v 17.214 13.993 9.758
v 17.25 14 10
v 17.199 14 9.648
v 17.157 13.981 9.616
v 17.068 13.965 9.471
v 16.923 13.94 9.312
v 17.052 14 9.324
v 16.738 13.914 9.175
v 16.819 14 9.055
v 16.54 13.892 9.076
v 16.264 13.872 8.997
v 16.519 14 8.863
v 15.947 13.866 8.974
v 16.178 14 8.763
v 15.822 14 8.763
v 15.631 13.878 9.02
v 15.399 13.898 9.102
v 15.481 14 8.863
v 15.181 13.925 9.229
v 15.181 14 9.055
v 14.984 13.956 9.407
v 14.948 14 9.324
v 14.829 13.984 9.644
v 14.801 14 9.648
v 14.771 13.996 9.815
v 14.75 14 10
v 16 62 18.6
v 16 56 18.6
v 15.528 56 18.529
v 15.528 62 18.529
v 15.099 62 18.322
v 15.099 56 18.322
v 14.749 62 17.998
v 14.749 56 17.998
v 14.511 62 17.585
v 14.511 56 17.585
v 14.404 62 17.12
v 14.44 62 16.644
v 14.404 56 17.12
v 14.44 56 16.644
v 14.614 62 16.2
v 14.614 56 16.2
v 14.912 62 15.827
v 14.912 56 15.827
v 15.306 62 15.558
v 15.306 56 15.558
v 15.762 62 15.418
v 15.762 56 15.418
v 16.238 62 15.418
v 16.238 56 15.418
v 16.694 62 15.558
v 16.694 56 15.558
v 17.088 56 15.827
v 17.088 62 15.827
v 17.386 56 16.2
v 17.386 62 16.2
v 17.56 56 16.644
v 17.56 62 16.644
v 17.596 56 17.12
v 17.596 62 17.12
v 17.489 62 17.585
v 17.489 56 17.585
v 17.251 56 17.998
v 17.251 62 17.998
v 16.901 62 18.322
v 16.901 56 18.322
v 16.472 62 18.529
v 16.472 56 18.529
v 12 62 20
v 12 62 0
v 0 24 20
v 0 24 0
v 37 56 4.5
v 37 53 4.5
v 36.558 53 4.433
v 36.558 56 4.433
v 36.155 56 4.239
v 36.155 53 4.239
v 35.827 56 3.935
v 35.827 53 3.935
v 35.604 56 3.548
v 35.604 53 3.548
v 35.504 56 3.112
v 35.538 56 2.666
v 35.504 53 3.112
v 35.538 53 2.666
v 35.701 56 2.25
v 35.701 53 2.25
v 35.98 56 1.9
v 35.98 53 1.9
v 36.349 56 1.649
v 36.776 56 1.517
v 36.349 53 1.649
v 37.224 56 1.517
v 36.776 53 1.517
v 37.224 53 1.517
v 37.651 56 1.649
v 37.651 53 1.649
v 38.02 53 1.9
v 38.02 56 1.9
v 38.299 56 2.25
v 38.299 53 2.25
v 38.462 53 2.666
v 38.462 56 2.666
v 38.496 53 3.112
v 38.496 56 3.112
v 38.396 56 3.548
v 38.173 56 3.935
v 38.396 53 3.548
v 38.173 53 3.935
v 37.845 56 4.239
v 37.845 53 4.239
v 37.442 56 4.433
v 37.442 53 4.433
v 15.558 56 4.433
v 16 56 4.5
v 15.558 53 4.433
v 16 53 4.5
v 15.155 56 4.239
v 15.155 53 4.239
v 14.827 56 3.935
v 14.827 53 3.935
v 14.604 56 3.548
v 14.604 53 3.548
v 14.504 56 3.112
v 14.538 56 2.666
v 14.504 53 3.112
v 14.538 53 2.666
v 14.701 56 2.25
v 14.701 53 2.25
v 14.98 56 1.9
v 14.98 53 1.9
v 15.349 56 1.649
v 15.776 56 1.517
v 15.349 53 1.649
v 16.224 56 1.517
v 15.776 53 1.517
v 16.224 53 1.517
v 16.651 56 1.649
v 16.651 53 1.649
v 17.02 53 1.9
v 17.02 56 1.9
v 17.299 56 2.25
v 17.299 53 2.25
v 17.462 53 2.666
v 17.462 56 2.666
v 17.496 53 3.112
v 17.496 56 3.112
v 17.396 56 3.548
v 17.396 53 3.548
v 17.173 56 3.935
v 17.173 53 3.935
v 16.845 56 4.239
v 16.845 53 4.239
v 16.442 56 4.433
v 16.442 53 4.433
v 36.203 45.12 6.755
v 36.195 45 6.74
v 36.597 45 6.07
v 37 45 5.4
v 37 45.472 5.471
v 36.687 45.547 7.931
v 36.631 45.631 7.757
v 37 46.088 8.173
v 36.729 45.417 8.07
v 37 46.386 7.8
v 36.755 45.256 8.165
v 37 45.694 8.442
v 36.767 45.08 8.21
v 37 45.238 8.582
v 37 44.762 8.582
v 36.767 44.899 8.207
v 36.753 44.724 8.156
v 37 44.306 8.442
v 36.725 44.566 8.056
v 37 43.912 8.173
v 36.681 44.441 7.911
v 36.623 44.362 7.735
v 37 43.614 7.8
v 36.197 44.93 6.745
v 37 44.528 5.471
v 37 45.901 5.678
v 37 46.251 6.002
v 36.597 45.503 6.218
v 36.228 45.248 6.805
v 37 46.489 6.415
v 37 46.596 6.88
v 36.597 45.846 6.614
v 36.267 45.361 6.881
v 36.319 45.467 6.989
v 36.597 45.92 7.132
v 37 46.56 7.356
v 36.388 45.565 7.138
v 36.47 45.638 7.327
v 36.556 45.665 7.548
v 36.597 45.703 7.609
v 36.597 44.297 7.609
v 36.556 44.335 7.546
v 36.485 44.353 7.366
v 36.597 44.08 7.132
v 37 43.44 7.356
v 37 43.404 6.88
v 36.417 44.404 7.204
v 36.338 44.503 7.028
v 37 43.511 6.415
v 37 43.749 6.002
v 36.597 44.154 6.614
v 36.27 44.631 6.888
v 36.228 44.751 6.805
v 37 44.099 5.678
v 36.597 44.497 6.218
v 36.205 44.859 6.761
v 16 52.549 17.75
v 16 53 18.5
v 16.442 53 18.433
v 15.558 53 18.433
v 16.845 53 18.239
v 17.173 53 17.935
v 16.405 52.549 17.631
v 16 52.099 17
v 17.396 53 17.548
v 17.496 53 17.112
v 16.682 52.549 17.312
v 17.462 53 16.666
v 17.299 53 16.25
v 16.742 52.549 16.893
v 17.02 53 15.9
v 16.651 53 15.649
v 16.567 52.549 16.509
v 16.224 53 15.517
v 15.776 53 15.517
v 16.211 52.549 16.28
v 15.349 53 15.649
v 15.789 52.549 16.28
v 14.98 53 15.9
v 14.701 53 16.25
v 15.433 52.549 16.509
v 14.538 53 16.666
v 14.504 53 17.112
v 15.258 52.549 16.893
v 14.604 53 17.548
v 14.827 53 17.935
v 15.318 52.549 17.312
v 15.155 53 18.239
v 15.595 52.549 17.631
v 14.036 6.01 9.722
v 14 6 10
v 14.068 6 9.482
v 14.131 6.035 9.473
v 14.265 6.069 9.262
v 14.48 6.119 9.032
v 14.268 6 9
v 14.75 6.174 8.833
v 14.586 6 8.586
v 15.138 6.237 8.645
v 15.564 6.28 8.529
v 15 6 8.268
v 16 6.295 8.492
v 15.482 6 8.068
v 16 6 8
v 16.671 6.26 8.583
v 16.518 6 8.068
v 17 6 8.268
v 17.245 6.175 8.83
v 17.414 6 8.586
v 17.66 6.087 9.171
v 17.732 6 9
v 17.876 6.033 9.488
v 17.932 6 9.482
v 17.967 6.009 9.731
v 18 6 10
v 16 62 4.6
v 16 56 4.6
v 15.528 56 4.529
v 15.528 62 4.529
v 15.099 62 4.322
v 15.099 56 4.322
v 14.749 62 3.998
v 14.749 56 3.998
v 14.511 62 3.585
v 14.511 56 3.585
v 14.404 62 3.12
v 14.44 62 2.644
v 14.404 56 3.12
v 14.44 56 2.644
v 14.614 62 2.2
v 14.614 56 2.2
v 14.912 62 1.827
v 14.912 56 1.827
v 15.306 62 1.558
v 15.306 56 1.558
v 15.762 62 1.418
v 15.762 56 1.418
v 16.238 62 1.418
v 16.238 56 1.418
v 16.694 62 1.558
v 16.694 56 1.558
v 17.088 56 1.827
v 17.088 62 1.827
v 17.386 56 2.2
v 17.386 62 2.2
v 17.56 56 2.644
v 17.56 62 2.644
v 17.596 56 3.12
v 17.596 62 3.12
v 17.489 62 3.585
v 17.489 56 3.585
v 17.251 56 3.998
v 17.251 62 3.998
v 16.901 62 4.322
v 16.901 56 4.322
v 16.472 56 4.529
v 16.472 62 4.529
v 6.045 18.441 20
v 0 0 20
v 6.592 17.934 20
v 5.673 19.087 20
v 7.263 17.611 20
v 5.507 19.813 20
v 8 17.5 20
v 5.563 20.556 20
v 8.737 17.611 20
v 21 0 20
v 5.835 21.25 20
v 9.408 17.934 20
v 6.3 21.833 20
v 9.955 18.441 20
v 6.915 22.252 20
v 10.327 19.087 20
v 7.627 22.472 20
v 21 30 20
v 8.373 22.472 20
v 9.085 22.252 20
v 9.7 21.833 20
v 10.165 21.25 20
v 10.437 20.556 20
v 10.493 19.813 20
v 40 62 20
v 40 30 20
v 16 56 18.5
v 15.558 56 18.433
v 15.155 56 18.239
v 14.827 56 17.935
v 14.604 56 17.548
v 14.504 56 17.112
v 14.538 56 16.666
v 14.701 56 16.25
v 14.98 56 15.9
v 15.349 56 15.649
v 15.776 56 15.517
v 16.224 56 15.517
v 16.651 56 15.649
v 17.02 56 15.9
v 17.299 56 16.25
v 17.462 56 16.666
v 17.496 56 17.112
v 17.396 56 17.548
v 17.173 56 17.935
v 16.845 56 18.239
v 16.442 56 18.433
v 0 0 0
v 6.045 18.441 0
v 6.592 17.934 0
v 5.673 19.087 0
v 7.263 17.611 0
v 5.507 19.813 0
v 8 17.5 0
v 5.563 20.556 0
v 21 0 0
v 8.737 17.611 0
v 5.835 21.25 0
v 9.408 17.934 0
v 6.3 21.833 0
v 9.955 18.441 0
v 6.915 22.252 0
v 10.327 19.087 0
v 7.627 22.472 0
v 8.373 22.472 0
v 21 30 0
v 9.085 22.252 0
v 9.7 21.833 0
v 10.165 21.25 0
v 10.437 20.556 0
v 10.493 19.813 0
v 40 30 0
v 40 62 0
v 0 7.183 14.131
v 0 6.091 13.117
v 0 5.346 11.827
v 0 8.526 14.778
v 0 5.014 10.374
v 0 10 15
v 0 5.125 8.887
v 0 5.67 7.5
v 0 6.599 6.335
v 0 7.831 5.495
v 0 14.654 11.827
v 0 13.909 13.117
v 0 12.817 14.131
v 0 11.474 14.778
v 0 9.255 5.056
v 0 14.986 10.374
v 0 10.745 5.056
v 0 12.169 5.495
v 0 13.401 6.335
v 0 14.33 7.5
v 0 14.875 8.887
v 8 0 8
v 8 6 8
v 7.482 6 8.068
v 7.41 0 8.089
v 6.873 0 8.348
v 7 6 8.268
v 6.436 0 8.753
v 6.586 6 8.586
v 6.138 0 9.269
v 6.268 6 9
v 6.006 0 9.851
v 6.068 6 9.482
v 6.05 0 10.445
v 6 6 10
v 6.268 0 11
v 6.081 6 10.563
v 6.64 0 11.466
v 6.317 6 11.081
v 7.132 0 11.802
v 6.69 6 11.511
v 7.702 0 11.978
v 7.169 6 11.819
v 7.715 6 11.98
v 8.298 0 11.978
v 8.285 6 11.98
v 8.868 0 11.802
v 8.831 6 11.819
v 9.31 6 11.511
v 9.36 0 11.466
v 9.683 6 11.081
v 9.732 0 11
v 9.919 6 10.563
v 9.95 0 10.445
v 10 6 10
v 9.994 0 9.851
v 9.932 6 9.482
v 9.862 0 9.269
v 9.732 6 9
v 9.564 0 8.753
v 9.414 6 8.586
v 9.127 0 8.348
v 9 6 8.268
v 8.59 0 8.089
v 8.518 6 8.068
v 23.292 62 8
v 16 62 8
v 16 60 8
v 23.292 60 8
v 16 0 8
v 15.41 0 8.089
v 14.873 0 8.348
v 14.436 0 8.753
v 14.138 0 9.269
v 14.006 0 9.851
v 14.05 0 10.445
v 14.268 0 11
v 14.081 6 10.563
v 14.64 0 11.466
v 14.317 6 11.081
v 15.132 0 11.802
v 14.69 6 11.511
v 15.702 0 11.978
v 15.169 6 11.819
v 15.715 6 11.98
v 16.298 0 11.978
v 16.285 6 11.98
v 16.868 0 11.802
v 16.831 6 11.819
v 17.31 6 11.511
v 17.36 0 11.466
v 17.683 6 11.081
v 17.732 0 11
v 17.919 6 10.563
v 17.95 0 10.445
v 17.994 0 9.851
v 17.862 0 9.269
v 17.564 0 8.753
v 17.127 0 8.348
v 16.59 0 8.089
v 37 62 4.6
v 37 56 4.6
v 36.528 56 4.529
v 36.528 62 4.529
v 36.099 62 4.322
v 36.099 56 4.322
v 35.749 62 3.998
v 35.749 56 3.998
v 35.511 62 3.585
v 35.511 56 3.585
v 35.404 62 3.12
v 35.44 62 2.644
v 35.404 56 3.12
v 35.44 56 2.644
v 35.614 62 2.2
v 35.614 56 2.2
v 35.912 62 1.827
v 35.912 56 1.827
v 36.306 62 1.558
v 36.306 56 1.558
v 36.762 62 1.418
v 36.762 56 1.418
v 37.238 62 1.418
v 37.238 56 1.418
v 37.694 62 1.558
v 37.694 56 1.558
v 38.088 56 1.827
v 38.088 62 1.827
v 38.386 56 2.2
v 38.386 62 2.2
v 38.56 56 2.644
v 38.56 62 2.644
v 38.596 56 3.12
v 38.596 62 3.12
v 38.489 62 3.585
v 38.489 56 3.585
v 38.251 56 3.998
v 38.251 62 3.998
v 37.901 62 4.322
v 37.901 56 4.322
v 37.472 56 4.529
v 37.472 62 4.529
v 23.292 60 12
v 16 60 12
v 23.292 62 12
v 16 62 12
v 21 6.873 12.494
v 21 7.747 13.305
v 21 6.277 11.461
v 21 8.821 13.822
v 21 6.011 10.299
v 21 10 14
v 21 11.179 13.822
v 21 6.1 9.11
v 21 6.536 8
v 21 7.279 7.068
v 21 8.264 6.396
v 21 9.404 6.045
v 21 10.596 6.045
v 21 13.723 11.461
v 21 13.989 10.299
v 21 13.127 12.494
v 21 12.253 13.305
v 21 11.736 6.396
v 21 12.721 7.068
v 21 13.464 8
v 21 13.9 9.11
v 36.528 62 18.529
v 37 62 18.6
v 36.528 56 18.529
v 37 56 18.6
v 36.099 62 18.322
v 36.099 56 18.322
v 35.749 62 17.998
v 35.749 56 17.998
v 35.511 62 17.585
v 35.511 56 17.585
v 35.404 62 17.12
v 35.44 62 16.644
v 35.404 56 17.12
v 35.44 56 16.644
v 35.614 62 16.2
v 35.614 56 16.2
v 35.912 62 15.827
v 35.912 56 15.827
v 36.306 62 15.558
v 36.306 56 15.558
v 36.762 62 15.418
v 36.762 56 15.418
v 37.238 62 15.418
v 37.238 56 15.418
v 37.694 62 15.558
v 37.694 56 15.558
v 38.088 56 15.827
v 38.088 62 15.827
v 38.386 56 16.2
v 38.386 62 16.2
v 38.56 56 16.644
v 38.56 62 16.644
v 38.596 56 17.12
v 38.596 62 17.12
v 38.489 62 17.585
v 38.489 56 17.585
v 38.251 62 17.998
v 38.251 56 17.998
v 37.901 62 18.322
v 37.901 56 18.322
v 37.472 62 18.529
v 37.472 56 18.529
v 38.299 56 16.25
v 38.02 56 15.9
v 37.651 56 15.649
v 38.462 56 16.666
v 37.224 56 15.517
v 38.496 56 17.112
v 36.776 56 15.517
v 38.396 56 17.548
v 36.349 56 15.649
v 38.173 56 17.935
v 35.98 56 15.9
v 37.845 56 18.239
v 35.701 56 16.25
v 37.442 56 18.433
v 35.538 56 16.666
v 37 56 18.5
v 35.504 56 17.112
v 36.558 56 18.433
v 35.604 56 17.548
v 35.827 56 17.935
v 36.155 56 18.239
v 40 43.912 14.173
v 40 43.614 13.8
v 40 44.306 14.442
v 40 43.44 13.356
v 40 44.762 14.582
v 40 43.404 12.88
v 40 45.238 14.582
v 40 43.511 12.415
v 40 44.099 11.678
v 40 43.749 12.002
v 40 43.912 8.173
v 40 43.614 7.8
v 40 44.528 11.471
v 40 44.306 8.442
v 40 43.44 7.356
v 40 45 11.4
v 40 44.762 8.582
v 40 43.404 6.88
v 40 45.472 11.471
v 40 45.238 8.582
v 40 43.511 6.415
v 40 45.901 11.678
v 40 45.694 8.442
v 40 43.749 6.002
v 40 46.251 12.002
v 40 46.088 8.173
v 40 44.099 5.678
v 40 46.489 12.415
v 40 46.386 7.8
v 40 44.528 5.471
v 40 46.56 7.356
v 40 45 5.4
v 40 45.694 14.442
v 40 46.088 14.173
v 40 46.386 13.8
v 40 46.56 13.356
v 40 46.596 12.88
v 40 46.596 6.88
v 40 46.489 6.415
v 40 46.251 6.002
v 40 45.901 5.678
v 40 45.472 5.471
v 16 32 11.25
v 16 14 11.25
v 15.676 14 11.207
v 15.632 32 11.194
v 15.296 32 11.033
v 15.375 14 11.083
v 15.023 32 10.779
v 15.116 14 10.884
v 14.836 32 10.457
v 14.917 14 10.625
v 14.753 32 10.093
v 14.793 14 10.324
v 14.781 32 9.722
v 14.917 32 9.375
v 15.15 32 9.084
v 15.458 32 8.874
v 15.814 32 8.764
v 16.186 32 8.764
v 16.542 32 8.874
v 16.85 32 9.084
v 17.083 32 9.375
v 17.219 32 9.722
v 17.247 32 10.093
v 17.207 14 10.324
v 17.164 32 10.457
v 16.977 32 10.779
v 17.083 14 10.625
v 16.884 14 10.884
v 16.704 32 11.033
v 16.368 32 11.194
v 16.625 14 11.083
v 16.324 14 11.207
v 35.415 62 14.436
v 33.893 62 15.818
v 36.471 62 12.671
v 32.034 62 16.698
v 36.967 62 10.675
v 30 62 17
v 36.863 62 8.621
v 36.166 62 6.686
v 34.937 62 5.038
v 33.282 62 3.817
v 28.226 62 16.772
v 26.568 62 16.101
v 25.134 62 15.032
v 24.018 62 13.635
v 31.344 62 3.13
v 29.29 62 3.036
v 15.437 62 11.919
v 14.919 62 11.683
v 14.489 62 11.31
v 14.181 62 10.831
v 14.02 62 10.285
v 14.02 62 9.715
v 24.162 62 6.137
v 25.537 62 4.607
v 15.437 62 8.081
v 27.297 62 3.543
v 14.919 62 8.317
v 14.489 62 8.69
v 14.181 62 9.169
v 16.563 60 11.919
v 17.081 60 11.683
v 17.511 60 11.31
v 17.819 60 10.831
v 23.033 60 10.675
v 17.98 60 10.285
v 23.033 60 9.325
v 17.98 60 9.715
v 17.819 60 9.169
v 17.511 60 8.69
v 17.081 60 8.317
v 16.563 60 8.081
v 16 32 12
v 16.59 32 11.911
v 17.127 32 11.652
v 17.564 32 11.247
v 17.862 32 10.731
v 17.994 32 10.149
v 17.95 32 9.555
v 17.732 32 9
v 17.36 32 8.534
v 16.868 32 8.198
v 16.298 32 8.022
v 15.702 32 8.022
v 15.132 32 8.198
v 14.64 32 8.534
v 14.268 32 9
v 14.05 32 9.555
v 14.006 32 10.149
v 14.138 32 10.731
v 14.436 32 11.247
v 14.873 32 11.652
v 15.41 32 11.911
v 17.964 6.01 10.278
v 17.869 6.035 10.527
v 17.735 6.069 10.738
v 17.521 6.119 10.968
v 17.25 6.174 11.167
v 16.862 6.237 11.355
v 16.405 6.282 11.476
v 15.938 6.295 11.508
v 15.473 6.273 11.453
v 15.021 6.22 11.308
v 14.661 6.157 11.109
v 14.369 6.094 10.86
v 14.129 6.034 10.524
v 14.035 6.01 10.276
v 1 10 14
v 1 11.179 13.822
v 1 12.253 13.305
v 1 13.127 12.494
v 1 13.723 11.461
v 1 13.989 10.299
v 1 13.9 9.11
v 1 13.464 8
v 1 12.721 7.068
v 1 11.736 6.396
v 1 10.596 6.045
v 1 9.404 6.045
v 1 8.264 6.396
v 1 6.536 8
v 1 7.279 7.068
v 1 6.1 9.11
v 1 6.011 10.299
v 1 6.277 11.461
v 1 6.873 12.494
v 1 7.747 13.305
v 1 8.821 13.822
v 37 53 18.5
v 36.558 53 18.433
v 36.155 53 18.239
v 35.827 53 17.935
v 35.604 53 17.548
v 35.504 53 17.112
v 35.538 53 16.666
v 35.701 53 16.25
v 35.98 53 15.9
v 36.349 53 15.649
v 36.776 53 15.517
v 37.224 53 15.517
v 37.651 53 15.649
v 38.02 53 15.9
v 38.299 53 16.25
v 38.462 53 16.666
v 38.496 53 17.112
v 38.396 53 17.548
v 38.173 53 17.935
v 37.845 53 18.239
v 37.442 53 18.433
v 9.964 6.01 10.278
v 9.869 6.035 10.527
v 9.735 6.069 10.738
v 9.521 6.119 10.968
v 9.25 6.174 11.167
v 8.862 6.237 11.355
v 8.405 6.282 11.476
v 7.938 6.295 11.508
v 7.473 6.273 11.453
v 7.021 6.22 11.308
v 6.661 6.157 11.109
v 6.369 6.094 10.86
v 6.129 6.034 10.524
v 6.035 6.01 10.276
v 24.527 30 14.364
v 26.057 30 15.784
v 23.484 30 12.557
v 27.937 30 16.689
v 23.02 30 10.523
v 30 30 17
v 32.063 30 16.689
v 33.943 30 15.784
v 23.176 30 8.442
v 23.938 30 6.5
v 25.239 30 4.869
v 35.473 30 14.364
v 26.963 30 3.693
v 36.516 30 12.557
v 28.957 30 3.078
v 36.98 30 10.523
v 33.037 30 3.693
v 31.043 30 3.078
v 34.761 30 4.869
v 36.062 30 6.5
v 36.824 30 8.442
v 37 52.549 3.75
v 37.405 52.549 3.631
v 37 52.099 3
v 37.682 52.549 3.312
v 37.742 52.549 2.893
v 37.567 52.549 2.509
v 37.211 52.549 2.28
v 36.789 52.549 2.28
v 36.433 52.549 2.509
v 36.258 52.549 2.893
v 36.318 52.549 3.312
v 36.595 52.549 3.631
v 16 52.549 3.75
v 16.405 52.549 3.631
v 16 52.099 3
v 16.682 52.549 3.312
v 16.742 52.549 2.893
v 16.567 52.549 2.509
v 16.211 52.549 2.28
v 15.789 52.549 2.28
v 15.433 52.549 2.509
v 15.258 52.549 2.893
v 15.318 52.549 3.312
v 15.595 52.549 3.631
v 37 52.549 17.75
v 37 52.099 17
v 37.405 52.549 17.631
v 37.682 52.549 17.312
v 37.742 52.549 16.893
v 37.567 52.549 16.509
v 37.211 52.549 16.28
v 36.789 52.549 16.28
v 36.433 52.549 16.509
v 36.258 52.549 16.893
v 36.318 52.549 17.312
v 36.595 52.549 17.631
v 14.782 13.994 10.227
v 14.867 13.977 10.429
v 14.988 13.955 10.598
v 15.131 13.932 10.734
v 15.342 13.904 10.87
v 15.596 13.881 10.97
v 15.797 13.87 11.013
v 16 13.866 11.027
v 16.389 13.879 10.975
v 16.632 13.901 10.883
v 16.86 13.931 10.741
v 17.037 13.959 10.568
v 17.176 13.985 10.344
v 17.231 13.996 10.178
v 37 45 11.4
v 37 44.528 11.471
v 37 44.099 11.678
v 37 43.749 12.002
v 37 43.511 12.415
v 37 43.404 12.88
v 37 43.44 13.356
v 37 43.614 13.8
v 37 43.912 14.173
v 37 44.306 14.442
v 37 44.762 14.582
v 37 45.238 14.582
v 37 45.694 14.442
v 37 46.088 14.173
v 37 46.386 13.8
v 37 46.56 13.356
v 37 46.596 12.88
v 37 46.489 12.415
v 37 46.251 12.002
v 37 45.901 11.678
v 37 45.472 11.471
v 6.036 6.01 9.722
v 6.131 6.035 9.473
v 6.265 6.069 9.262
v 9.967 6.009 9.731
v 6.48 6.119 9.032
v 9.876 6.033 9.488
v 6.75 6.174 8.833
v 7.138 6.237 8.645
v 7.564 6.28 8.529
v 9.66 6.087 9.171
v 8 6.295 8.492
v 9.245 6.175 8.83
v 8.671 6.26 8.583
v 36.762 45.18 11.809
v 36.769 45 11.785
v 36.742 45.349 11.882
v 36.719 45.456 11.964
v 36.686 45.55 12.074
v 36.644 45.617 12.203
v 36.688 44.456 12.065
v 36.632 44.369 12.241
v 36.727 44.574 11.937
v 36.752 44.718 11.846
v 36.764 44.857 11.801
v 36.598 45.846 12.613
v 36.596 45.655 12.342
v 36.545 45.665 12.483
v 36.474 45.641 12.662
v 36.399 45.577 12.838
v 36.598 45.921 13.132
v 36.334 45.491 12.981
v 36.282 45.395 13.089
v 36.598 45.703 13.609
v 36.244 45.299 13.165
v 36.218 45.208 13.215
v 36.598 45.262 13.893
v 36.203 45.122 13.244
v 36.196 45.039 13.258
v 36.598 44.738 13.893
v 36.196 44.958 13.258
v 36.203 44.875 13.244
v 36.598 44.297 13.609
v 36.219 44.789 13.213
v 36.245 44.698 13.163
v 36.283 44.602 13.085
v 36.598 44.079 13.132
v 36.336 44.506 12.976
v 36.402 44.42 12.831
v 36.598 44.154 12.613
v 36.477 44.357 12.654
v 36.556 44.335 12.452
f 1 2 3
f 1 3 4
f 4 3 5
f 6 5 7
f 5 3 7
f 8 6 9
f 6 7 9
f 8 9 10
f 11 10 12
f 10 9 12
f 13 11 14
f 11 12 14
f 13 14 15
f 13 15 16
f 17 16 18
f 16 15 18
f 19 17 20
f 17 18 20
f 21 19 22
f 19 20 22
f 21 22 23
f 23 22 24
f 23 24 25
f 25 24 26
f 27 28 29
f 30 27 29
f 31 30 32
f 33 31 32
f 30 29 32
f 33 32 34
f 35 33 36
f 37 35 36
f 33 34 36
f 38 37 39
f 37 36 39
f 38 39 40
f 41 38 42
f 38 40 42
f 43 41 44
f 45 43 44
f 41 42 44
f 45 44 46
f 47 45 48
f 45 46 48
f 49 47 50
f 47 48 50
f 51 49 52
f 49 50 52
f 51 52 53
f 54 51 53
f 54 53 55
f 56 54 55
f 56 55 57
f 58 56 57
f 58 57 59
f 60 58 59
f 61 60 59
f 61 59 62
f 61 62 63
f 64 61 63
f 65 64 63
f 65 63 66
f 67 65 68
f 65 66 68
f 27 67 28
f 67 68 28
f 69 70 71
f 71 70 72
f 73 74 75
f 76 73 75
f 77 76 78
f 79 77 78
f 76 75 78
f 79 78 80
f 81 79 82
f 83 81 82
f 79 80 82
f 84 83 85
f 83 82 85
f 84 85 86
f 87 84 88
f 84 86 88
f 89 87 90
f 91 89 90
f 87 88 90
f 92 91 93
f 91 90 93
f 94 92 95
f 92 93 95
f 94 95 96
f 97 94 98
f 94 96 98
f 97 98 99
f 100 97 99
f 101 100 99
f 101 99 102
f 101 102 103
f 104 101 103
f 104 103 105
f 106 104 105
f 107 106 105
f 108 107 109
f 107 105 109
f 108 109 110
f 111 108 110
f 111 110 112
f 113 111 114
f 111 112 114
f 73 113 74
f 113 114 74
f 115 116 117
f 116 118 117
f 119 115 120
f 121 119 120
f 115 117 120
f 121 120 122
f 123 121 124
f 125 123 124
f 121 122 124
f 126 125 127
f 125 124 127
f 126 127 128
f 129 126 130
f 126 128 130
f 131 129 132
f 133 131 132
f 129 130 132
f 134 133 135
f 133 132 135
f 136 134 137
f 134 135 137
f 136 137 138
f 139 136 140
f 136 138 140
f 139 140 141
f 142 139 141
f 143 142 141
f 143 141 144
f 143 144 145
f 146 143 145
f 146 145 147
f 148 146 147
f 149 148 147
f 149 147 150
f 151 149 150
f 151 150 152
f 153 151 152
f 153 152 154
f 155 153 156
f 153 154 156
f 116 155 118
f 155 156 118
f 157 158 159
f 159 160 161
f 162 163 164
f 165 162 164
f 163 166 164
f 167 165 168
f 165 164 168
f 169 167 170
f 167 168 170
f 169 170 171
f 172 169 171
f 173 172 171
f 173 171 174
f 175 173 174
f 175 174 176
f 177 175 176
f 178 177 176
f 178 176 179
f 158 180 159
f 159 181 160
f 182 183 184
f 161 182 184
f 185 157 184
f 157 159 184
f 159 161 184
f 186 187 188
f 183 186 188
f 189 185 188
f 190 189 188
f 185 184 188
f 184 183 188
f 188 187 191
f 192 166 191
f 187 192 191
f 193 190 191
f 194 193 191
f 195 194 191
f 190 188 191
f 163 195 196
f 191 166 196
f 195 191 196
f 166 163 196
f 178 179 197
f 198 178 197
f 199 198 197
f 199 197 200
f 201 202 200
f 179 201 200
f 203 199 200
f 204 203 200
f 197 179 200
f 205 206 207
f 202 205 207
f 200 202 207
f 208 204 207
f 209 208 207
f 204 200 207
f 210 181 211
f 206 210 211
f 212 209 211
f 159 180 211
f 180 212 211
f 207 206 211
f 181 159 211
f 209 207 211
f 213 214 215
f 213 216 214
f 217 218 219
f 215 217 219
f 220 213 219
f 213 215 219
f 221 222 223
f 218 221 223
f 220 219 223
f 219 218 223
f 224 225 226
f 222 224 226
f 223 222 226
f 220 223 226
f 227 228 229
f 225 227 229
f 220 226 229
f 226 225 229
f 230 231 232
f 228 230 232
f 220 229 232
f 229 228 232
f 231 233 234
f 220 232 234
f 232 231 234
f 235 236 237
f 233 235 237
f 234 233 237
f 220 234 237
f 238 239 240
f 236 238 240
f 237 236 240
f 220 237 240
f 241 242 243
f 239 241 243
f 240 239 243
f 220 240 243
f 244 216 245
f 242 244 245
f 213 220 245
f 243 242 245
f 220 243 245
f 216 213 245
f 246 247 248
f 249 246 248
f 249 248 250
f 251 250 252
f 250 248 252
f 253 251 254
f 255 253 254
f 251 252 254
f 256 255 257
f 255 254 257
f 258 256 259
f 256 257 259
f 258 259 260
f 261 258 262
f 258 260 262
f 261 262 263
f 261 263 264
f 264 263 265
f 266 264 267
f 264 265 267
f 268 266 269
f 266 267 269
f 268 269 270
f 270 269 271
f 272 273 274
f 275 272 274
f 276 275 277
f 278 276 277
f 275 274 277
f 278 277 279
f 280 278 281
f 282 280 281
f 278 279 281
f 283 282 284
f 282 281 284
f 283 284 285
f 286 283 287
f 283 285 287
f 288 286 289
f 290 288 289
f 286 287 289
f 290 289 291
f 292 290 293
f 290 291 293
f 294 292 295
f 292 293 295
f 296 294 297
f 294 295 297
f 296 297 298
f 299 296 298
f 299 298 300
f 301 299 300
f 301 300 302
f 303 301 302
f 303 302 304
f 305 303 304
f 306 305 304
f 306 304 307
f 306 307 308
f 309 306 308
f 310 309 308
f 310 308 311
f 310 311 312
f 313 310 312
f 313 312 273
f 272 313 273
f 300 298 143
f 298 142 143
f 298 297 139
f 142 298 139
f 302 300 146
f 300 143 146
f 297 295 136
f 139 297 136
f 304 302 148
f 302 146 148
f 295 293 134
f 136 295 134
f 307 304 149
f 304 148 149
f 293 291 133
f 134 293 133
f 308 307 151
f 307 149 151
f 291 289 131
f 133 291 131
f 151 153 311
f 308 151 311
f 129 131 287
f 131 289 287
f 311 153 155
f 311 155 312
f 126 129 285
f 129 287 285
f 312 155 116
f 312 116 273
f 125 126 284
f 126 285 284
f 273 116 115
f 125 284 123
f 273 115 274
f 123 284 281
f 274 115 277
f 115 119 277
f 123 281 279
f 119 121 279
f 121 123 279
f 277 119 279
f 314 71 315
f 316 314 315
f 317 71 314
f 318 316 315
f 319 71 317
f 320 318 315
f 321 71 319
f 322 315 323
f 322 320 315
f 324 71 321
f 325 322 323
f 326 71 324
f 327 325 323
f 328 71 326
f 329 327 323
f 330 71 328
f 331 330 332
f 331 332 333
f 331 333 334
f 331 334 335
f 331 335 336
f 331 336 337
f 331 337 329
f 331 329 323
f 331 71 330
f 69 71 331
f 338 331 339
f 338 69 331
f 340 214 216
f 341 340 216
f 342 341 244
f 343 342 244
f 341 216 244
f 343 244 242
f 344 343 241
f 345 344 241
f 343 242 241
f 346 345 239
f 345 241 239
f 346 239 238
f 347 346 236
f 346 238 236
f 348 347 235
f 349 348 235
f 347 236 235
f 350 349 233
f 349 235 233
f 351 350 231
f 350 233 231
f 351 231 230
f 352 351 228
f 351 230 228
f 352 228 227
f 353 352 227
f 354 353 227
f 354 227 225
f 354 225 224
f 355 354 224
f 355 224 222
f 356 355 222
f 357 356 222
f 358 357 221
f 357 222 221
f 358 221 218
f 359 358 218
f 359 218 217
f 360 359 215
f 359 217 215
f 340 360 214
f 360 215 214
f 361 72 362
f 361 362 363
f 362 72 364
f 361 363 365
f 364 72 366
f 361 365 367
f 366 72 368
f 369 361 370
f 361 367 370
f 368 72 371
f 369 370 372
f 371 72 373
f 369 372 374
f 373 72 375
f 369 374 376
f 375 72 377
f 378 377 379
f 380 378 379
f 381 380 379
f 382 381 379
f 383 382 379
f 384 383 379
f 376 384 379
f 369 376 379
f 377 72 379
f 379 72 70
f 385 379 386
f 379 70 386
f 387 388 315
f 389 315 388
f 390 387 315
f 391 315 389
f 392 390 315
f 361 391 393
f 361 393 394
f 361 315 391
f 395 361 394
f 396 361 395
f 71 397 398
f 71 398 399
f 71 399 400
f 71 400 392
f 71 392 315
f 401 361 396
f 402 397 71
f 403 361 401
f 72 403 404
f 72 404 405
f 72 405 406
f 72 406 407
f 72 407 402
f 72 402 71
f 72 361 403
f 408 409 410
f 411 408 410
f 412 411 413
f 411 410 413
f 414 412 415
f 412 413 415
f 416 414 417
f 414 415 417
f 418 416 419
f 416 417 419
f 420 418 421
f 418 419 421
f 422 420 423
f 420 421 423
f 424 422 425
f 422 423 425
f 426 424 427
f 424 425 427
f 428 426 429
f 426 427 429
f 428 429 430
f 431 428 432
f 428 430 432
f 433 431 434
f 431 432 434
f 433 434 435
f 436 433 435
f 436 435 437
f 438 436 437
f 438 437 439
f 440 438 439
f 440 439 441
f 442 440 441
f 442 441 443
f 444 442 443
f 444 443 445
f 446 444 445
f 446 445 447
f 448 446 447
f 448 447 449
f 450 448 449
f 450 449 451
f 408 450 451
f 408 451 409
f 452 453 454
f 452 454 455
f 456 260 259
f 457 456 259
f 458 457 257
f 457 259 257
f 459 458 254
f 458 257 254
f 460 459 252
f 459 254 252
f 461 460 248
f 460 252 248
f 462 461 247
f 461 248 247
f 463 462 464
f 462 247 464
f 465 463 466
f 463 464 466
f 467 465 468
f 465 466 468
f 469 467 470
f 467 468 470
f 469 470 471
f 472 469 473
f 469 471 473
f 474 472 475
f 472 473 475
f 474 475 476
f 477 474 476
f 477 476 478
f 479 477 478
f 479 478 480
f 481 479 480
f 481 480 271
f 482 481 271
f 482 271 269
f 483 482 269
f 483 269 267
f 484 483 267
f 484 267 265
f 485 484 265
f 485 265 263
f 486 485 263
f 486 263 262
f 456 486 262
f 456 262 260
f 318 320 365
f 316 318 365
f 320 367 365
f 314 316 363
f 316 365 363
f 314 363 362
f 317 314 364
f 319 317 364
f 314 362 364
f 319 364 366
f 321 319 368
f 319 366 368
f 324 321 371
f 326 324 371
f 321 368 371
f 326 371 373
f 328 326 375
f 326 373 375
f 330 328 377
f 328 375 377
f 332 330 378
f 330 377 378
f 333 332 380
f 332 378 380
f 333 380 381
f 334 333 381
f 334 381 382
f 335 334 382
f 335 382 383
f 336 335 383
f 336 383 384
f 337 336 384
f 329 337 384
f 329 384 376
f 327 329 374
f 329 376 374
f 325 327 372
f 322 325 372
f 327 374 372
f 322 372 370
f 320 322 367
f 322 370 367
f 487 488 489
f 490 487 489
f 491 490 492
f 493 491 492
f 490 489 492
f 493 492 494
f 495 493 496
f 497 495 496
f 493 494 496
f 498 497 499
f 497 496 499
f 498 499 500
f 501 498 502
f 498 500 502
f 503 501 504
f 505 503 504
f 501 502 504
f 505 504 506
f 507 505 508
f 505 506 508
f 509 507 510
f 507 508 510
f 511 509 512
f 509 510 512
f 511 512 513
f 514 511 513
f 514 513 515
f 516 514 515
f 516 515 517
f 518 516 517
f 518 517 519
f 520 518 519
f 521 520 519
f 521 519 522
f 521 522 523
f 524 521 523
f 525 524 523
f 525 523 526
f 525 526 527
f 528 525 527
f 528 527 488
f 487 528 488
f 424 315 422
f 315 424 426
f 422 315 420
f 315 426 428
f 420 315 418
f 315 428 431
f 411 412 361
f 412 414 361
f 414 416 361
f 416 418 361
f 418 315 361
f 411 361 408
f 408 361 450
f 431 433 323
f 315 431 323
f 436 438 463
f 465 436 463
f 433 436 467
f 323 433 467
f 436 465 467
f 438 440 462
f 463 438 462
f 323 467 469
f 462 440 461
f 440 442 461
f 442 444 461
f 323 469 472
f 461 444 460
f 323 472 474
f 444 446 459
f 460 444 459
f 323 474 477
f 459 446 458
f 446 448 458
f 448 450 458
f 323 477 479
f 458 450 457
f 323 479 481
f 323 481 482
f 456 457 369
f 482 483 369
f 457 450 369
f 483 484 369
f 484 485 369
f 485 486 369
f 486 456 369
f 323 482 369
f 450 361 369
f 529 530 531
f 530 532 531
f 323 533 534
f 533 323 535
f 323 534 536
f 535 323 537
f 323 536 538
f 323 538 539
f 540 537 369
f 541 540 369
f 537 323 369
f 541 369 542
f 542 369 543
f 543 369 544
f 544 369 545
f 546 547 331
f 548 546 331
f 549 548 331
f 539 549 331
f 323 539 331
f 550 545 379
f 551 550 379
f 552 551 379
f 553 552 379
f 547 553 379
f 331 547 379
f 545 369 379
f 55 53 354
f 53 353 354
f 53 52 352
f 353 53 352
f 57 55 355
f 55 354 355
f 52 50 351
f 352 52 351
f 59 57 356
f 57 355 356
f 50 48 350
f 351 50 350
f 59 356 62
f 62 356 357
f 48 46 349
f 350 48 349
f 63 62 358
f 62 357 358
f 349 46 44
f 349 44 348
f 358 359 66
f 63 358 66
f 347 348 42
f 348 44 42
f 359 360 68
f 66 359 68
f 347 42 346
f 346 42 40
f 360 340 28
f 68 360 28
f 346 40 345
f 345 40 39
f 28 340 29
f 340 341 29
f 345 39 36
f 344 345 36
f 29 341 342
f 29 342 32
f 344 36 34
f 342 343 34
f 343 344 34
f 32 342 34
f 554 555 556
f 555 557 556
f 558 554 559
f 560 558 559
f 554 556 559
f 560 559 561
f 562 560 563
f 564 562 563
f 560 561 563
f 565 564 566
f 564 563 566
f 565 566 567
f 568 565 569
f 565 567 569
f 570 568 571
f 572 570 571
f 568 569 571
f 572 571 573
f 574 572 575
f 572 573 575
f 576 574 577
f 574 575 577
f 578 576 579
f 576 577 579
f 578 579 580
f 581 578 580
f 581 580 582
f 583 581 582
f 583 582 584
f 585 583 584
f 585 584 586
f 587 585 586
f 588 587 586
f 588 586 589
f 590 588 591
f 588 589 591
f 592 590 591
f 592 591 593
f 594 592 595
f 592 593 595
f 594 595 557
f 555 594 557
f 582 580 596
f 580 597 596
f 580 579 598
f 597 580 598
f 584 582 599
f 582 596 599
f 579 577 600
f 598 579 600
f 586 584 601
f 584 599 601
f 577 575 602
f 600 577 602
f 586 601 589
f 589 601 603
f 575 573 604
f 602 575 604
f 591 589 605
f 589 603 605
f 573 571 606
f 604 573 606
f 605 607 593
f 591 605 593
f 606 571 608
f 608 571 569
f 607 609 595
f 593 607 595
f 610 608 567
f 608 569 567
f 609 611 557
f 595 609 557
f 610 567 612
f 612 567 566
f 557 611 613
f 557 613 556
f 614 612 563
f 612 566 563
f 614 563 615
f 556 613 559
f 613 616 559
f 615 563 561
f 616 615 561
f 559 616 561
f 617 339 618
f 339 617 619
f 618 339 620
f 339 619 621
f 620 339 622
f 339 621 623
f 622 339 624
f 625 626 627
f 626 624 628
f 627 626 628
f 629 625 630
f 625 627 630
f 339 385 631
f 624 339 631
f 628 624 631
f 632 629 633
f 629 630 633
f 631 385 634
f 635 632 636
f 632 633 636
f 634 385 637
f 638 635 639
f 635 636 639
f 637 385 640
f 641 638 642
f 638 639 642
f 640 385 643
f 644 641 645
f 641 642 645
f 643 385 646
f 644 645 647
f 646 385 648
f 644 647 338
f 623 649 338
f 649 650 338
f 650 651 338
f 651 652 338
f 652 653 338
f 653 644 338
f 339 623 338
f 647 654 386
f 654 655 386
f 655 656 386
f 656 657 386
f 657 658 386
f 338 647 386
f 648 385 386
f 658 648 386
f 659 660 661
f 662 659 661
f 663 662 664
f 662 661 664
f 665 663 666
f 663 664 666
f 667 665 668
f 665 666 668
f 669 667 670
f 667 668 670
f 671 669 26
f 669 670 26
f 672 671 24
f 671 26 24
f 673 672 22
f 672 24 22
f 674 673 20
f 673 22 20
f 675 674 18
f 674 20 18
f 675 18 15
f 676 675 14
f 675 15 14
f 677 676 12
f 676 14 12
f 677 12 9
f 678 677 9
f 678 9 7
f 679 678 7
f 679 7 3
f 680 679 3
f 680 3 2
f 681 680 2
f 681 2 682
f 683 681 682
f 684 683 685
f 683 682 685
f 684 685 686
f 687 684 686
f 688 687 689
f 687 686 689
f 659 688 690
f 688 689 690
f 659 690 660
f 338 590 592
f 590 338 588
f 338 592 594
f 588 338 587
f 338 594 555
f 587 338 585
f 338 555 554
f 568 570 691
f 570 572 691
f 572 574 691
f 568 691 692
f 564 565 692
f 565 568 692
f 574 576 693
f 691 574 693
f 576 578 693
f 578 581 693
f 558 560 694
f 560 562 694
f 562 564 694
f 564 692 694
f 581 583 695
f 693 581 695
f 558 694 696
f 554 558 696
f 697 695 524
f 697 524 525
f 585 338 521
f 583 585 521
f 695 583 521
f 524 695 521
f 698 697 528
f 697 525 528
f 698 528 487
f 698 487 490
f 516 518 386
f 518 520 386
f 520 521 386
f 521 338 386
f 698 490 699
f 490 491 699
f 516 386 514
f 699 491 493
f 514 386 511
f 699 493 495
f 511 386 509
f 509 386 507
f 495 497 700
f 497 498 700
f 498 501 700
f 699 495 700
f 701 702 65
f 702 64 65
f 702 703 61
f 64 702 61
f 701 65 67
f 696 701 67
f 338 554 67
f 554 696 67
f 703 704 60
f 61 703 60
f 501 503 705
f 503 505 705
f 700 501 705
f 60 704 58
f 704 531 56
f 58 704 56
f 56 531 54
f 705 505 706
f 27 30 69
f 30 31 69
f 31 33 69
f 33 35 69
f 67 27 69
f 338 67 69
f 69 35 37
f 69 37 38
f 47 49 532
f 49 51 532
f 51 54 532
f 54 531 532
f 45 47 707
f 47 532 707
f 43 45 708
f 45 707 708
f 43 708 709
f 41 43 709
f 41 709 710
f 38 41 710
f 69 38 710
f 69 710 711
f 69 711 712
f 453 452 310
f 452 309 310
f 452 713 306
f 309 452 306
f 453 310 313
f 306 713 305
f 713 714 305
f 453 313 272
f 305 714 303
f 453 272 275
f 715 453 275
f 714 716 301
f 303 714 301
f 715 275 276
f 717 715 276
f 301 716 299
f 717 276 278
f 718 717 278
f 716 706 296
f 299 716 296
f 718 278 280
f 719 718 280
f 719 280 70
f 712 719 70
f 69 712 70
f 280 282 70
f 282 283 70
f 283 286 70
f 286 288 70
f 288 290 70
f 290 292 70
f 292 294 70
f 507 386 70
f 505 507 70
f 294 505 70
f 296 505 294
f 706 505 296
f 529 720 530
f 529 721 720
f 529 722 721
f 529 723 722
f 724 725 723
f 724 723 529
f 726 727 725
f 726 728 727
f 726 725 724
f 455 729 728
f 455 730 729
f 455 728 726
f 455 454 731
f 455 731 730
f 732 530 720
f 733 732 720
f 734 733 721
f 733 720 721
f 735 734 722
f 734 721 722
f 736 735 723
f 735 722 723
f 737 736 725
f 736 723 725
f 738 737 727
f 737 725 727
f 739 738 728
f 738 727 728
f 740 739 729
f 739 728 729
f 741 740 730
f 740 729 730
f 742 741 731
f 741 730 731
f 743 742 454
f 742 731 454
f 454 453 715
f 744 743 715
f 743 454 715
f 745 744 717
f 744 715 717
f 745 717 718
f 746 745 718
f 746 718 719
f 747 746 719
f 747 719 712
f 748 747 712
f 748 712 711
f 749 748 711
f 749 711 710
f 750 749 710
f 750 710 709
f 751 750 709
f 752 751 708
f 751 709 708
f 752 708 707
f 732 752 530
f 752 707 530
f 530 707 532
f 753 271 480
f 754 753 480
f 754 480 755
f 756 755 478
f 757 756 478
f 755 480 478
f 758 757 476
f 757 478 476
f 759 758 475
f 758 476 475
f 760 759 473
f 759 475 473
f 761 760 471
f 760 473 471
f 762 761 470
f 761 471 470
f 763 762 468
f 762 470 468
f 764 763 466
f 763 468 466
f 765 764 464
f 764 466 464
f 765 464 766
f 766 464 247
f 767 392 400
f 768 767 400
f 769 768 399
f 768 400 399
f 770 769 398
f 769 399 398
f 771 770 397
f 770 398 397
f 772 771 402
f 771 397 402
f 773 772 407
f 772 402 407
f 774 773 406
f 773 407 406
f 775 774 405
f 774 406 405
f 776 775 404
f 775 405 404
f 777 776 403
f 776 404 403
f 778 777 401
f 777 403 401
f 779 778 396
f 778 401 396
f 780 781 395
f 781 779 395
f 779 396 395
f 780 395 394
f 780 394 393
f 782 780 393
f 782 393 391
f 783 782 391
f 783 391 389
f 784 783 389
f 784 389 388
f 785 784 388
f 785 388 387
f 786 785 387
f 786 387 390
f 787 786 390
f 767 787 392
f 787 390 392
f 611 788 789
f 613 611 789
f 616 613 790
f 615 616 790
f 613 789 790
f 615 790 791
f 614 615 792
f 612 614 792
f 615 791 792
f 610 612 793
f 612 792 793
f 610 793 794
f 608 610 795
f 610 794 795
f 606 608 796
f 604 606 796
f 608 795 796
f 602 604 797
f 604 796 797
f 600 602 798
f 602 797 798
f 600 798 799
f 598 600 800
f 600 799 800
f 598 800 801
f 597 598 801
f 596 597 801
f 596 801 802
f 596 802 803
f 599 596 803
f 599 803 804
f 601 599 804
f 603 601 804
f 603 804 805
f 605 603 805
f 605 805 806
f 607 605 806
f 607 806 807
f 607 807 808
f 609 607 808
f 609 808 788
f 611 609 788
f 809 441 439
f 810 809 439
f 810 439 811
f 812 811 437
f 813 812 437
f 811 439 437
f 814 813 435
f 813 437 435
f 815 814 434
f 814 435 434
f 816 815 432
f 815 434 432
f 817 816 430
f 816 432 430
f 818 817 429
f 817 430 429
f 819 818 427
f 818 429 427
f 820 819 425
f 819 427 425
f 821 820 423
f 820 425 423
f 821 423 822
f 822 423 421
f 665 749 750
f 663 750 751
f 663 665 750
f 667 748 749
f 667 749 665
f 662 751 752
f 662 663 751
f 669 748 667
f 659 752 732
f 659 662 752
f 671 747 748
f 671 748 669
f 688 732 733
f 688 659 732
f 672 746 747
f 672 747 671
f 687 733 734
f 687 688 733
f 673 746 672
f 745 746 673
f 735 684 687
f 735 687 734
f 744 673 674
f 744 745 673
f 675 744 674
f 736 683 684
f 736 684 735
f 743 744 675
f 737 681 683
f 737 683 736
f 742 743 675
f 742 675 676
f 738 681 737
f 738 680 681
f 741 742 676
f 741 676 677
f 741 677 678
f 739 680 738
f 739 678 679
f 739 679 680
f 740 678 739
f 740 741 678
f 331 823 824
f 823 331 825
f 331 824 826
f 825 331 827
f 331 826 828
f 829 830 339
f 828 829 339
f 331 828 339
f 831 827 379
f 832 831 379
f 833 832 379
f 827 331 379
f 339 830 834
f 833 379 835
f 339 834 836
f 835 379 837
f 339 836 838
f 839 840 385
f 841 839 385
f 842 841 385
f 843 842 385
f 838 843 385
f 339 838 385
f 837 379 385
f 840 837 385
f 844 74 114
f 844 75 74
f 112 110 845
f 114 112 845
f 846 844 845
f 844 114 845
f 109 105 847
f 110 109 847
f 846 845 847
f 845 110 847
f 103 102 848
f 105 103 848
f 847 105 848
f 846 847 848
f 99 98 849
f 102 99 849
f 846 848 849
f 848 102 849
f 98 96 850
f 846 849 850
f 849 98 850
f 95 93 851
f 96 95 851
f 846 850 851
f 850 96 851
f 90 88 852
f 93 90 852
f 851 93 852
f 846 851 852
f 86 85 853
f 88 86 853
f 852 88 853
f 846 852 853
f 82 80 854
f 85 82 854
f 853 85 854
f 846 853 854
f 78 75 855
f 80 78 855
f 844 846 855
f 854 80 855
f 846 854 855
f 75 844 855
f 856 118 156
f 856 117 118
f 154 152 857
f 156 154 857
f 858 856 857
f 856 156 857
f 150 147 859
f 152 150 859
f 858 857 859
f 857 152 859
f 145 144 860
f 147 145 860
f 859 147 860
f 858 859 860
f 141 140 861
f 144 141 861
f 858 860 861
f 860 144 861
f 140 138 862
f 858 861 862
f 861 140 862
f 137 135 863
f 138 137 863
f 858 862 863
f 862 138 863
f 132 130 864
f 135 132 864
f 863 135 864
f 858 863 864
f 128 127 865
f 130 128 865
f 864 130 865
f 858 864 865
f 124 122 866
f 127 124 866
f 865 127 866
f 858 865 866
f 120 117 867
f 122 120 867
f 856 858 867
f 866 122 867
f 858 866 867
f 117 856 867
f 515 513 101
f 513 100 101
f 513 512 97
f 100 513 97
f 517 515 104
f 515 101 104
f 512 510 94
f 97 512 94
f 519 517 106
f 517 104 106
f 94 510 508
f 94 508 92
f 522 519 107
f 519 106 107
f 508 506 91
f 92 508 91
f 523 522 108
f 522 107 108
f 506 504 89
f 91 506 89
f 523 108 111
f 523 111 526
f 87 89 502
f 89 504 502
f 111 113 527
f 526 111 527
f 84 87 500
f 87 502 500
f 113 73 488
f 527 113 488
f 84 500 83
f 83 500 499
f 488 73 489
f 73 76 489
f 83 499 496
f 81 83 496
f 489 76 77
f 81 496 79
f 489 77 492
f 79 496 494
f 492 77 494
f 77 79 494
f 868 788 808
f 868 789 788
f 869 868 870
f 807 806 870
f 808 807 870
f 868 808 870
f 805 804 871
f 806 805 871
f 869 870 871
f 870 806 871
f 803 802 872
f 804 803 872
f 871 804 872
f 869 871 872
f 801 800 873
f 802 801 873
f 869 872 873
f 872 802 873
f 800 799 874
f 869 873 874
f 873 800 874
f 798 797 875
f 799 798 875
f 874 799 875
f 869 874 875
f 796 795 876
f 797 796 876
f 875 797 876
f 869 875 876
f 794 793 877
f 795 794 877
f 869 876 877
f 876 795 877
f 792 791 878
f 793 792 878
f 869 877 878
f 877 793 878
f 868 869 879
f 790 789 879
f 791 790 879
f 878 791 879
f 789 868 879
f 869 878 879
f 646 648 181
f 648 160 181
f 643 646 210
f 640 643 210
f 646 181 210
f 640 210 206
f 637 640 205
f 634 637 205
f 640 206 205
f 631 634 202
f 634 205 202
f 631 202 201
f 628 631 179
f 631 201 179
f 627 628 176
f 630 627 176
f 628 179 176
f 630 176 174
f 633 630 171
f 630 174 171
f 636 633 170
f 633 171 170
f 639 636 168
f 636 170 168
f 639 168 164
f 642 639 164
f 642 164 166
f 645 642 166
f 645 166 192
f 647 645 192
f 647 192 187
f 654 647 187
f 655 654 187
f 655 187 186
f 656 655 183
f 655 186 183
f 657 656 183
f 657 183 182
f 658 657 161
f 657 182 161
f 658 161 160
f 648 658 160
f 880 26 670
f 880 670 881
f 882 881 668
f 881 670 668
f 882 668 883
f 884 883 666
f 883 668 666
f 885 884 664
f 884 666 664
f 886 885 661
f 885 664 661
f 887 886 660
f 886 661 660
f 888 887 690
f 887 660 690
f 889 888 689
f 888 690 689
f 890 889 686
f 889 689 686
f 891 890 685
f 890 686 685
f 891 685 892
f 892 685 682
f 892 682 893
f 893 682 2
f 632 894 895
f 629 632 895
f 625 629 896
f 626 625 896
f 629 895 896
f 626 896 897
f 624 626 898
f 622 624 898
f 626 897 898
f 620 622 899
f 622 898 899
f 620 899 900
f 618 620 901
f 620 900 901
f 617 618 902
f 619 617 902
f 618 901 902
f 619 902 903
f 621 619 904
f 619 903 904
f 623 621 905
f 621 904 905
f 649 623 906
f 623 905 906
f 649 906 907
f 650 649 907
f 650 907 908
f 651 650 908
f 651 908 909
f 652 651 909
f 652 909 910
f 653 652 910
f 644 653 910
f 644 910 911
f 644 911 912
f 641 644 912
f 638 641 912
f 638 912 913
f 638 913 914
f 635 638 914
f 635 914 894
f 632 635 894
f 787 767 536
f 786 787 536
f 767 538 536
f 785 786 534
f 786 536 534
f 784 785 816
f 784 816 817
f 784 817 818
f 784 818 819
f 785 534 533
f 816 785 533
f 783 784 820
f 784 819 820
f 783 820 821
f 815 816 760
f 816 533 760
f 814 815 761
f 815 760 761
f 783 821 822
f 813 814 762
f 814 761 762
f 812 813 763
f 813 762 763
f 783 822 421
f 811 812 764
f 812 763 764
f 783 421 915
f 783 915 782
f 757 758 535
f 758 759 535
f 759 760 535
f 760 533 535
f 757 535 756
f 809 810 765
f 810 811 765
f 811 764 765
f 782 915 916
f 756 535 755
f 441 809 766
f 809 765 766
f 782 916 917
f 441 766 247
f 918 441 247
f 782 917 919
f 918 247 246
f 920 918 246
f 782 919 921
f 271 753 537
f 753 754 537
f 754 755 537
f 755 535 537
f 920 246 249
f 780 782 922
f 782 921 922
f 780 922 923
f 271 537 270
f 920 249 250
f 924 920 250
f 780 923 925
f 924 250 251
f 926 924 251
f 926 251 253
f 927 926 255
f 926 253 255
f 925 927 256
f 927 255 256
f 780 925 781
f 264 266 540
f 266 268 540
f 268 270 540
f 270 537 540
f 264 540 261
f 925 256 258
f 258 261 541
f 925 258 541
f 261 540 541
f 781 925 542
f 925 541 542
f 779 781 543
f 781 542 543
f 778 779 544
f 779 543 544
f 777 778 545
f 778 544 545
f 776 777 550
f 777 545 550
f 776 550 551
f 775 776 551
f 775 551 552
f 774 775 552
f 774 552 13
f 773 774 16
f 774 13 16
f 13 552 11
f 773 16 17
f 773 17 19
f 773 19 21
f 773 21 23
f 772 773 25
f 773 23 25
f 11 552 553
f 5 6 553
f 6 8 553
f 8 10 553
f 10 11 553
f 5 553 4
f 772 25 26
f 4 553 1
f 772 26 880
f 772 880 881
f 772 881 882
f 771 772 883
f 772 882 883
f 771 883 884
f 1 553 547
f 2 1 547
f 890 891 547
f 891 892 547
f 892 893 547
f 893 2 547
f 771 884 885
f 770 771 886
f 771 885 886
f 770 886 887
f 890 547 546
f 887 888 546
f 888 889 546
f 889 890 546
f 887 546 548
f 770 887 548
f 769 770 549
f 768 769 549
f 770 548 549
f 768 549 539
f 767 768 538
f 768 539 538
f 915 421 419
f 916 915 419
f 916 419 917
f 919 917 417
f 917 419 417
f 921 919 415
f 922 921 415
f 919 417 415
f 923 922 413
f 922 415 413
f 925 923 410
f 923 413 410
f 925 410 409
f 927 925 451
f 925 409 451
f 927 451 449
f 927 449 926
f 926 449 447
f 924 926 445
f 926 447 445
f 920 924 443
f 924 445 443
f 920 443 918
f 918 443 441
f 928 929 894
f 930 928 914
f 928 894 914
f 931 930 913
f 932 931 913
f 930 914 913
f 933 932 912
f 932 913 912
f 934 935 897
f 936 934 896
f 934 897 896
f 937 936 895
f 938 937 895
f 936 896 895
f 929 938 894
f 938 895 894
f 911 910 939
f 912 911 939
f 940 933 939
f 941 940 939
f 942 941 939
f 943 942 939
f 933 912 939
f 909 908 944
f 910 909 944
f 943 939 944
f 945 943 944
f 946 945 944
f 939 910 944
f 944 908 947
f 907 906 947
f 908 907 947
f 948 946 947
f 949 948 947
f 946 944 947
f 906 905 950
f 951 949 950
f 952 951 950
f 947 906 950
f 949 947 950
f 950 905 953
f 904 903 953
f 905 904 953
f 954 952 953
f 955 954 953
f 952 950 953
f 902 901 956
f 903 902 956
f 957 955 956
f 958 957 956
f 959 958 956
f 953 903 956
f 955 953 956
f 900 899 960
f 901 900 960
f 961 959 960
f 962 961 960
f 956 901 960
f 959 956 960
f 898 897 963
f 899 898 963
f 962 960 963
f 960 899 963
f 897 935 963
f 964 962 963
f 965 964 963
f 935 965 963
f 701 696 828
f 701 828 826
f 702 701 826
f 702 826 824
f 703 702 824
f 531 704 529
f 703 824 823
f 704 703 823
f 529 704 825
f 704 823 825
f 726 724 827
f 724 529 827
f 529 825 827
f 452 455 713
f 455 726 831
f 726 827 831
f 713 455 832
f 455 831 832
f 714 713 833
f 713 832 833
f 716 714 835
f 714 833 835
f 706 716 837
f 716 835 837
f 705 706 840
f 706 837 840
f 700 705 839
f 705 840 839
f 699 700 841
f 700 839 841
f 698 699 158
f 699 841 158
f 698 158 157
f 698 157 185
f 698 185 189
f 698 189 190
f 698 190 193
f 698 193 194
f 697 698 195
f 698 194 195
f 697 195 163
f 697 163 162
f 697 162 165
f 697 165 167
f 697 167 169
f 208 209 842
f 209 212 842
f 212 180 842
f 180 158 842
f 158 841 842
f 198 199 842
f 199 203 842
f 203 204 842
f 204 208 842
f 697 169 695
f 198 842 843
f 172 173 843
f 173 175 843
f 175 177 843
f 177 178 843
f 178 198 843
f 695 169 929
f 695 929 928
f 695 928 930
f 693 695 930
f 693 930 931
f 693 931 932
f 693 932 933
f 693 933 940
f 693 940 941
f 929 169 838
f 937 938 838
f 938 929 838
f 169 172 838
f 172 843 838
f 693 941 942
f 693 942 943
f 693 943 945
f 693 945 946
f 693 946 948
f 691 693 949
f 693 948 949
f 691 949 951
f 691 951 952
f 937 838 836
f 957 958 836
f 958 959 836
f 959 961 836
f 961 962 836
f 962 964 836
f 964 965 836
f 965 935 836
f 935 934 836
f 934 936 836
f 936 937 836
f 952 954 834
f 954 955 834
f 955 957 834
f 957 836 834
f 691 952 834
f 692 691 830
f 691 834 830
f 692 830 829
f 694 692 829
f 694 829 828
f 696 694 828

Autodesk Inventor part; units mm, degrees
ref_plane "YZ Plane" through (0, 0, 0) normal (1, 0, 0) x (0, 1, 0)
ref_plane "XZ Plane" through (0, 0, 0) normal (0, 1, 0) x (-1, 0, 0)
sketch "Sketch1" plane through (0, 0, 0) normal (0, 0, 1) x (1, 0, 0)
  line L0 (0, 0) -> (0, 24)
  line L1 (0, 0) -> (21, 0)
  line L2 (21, 0) -> (21, 30)
  line L3 (21, 30) -> (40, 30)
  line L4 (40, 30) -> (40, 62)
  line L5 (40, 62) -> (12, 62)
  line L6 (12, 62) -> (0, 24)
  dimension "d0" = 24
  dimension "d1" = 21
  dimension "d2" = 30
  dimension "d3" = 19
  dimension "d4" = 32
  dimension "d5" = 28
extrude "Extrusion1" add sketch "Sketch1" along normal blind 20
sketch "Sketch2" plane through (12, 62, 0) normal (0, 1, 0) x (1, 0, 0)
  line L0 (28, 0) -> (28, -20) projected
  line L1 (28, -10) -> (18, -10)
  line L2 (28, 0) -> (28, -20) projected
  line L3 (28, -20) -> (0, -20) projected
  line L4 (0, -20) -> (0, 0) projected
  line L5 (0, 0) -> (28, 0) projected
  line L6 (28, 0) -> (28, -20) projected
  line L7 (28, -20) -> (0, -20) projected
  line L8 (0, -20) -> (0, 0) projected
  line L9 (0, 0) -> (28, 0) projected
  circle A0 centre (24, -17) radius 1.5
  circle A1 centre (24, -3) radius 1.5
  circle A2 centre (4, -3) radius 1.5
  circle A3 centre (4, -17) radius 1.5
  point P0 (-12, 0)
  point P1 (14, -10)
  dimension "d8" = 10
  dimension "d18" = 3
  dimension "d19" = 3
  dimension "d20" = 3
hole "Hole1" at (30, 62, 10) direction (0, -1, 0) diameter 14 end through all
sketch "Sketch3" plane through (12, 62, 0) normal (0, 1, 0) x (1, 0, 0)
  line L0 (28, 0) -> (28, -20) projected
  line L1 (28, -20) -> (25, -20)
  line L2 (28, -20) -> (0, -20) projected
  line L3 (25, -20) -> (25, 0)
  line L4 (28, 0) -> (0, 0) projected
  line L5 (25, 0) -> (4, 0)
  line L6 (4, 0) -> (4, -20)
  line L7 (4, -20) -> (25, -20)
  line L8 (4, -10) -> (4, -17)
  line L9 (4, -17) -> (25, -17)
  line L10 (25, -17) -> (25, -3)
  line L11 (25, -3) -> (4, -3)
  point P0 (-12, 0)
  dimension "d21" = 3
  dimension "d22" = 21
  dimension "d23" = 7
hole "Hole2" at (37, 62, 17) at (37, 62, 3) at (16, 62, 3) at (16, 62, 17) direction (0, -1, 0) diameter 3.2 depth 6
sketch "Sketch4" plane through (12, 62, 0) normal (0, 1, 0) x (1, 0, 0)
  point P0 (-12, 0)
sketch "Sketch5" plane through (12, 62, 0) normal (0, 1, 0) x (1, 0, 0)
  circle A0 centre (18, -10) radius 7 projected
  circle A1 centre (4, -10) radius 2
  line L0 (4, -12) -> (11.2918, -12)
  line L1 (4, -8) -> (11.2918, -8)
  point P0 (-12, 0)
  dimension "d32" = 4
extrude "Extrusion2" cut sketch "Sketch5" against normal blind 2 contours A0 L0 A1 L1
sketch "Sketch6" plane through (12, 62, 0) normal (0, 1, 0) x (1, 0, 0)
  arc A0 (4, -12) -> (4, -8) centre (4, -10) ccw projected
  circle A1 centre (4, -10) radius 2
  point P0 (-12, 0)
extrude "Extrusion3" cut sketch "Sketch6" against normal blind 30
sketch "Sketch7" plane through (0, 0, 0) normal (-1, 0, 0) x (0, 0, 1)
  line L0 (0, 0) -> (20, 0) projected
  line L1 (10, 0) -> (10, 10)
  dimension "d37" = 10
hole "Hole3" at (0, 10, 10) direction (1, 0, 0) diameter 8 end through all countersink diameter 10 countersink angle 90
sketch "Sketch8" plane through (0, 0, 20) normal (0, 0, 1) x (1, 0, 0)
  line L0 (0, 24) -> (0, 0) projected
  line L1 (0, 0) -> (0, 20)
  line L2 (0, 20) -> (8, 20)
  dimension "d45" = 20
  dimension "d46" = 8
hole "Hole4" at (8, 20, 20) direction (0, 0, -1) diameter 5 end through all
ref_plane "Work Plane1" through (12, 32, 0) normal (0, 1, 0) x (1, 0, 0)
sketch "Sketch9" plane through (12, 32, 0) normal (0, 1, 0) x (1, 0, 0)
  arc A0 (4, -12) -> (4, -8) centre (4, -10) ccw projected
  circle A1 centre (4, -10) radius 1.25
  point P0 (-12, 0)
  dimension "d55" = 2.5
hole "Hole5" at (16, 32, 10) direction (0, -1, 0) diameter 2.5 depth 18 tip angle 118
hole "Hole6" at (16, 62, 17) at (37, 62, 17) at (37, 62, 3) at (16, 62, 3) direction (0, -1, 0) diameter 3 depth 9 tip angle 118
hole "Hole7" at (16, 62, 17) at (37, 62, 17) at (37, 62, 3) at (16, 62, 3) direction (0, -1, 0) diameter 3 depth 9 tip angle 118
sketch "Sketch10" plane through (0, 0, 0) normal (0, -1, 0) x (1, 0, 0)
  line L0 (0, 5) -> (0, 15) projected
  line L1 (0, 10) -> (8, 10)
  arc A0 (16, 12) -> (16, 8) centre (16, 10) ccw projected
  line L2 (8, 10) -> (16, 10)
  point P0 (0, 0)
  dimension "d77" = 8
  dimension "d78" = 8
hole "Hole8" at (8, 0, 10) at (16, 0, 10) direction (0, 1, 0) diameter 4 depth 6 tip angle 118
sketch "Sketch11" plane through (40, 30, 0) normal (1, 0, 0) x (0, 0, -1)
  line L0 (-12, 32) -> (-8, 32) projected
  line L1 (-10, 32) -> (-10, 15)
  line L2 (-10, 15) -> (-13, 15)
  line L3 (-13, 15) -> (-7, 15)
  point P0 (0, -30)
  dimension "d86" = 17
  dimension "d87" = 3
  dimension "d88" = 6
hole "Hole9" at (40, 45, 13) at (40, 45, 7) direction (-1, 0, 0) diameter 3.2 depth 3 tip angle 118
properties part number "MOTORBLOCK PART 3" material "Steel ASTM A36"
